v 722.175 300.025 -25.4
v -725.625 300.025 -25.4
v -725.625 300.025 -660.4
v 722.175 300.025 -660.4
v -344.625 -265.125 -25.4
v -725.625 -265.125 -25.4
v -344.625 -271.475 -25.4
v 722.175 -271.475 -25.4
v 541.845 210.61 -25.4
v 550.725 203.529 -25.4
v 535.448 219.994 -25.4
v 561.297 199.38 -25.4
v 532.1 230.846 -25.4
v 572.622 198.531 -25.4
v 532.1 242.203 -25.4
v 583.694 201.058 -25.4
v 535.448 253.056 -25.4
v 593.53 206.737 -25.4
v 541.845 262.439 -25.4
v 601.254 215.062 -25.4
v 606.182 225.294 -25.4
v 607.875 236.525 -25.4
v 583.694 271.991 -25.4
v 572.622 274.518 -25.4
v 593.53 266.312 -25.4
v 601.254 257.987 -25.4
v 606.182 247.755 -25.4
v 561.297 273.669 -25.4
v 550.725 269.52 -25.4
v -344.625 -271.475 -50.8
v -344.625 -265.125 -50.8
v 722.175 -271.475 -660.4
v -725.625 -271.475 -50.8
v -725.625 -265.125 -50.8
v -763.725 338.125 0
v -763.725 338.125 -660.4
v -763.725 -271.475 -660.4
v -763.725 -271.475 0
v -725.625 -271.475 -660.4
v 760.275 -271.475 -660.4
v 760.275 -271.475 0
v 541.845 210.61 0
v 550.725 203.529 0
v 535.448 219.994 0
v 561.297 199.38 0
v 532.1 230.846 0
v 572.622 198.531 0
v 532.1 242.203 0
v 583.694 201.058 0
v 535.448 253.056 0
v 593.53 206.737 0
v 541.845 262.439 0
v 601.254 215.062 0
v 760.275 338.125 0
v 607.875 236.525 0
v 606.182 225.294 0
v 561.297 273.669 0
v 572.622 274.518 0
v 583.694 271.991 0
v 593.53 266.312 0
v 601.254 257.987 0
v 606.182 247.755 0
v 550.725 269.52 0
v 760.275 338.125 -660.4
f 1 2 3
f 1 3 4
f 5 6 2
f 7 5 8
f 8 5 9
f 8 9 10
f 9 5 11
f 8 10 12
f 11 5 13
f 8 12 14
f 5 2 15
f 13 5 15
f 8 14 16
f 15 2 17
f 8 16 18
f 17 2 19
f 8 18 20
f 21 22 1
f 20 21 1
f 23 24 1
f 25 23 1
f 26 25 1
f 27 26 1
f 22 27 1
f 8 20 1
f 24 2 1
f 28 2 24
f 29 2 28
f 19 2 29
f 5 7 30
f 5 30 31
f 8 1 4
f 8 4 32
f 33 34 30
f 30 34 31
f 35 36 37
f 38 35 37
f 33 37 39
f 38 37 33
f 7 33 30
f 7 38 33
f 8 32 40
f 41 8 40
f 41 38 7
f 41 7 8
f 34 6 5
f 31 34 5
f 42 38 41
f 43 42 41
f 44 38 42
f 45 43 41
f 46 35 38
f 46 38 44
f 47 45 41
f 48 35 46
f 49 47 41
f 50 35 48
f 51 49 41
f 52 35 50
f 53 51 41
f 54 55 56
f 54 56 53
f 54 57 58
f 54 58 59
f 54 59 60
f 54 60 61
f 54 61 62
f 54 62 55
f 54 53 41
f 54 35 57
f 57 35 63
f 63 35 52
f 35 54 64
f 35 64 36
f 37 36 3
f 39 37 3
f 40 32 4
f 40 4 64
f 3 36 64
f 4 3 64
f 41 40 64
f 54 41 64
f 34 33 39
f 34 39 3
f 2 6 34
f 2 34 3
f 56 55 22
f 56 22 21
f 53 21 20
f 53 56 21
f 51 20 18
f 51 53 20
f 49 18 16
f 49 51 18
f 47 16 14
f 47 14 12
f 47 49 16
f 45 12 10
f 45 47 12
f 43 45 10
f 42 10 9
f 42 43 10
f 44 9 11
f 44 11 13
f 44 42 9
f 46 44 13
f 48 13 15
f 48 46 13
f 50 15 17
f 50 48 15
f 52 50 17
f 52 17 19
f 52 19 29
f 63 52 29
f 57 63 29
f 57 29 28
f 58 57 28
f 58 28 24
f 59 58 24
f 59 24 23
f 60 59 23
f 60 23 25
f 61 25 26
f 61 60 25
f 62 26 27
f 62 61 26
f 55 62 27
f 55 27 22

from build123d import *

# Parameters (mm, degrees)
F1_DEPTH = 25.4
F0_W     = 1295.4
F0_H     = 38.1
F0_W_2   = 152.4
F2_DEPTH = 660.4
F0_W_3   = 381
F0_H_2   = 6.35
F3_DEPTH = 50.8


with BuildPart() as f1:
    # F0 (on Top) → F1 (new body)
    with BuildSketch(Plane.XY):
        with BuildLine():
            Line((722.1747212052, 300.0245658736), (569.7747212052, 300.0245658736))
            Line((569.7747212052, 300.0245658736), (569.7747212052, 274.6245658736))
            ThreePointArc((569.7747212052, 274.6245658736), (596.7154895684, 263.4653342368), (607.8747212052, 236.5245658736))
            Line((607.8747212052, 236.5245658736), (722.1747212052, 236.5245658736))
            Line((722.1747212052, 236.5245658736), (722.1747212052, 300.0245658736))
        make_face()
        with BuildLine():
            Line((569.7747212052, 300.0245658736), (-725.6252787948, 300.0245658736))
            Line((-725.6252787948, 300.0245658736), (-725.6252787948, -265.1254341264))
            Line((-725.6252787948, -265.1254341264), (-344.6252787948, -265.1254341264))
            Line((-344.6252787948, -265.1254341264), (-344.6252787948, -271.4754341264))
            Line((-344.6252787948, -271.4754341264), (722.1747212052, -271.4754341264))
            Line((722.1747212052, -271.4754341264), (722.1747212052, 236.5245658736))
            Line((722.1747212052, 236.5245658736), (607.8747212052, 236.5245658736))
            ThreePointArc((607.8747212052, 236.5245658736), (542.833952842, 209.5837975104), (569.7747212052, 274.6245658736))
            Line((569.7747212052, 274.6245658736), (569.7747212052, 300.0245658736))
        make_face()
    extrude(amount=-F1_DEPTH)

    # F0 (on Top) → F2 (join)
    with BuildSketch(Plane.XY):
        with Locations((-77.9252787948, 319.0745658736)):
            Rectangle(F0_W, F0_H)
        with Locations((645.9747212052, 319.0745658736)):
            Rectangle(F0_W_2, F0_H)
        Polygon((760.2747212052, 338.1245658736), (722.1747212052, 338.1245658736), (722.1747212052, 300.0245658736), (722.1747212052, 236.5245658736), (722.1747212052, -271.4754341264), (760.2747212052, -271.4754341264), align=None)
        Polygon((-725.6252787948, 338.1245658736), (-763.7252787948, 338.1245658736), (-763.7252787948, -271.4754341264), (-725.6252787948, -271.4754341264), (-725.6252787948, -265.1254341264), (-725.6252787948, 300.0245658736), align=None)
    extrude(amount=-F2_DEPTH)

    # F0 (on Top) → F3 (join)
    with BuildSketch(Plane.XY):
        with Locations((-535.1252787948, -268.3004341264)):
            Rectangle(F0_W_3, F0_H_2)
    extrude(amount=-F3_DEPTH)


solid = f1.part
